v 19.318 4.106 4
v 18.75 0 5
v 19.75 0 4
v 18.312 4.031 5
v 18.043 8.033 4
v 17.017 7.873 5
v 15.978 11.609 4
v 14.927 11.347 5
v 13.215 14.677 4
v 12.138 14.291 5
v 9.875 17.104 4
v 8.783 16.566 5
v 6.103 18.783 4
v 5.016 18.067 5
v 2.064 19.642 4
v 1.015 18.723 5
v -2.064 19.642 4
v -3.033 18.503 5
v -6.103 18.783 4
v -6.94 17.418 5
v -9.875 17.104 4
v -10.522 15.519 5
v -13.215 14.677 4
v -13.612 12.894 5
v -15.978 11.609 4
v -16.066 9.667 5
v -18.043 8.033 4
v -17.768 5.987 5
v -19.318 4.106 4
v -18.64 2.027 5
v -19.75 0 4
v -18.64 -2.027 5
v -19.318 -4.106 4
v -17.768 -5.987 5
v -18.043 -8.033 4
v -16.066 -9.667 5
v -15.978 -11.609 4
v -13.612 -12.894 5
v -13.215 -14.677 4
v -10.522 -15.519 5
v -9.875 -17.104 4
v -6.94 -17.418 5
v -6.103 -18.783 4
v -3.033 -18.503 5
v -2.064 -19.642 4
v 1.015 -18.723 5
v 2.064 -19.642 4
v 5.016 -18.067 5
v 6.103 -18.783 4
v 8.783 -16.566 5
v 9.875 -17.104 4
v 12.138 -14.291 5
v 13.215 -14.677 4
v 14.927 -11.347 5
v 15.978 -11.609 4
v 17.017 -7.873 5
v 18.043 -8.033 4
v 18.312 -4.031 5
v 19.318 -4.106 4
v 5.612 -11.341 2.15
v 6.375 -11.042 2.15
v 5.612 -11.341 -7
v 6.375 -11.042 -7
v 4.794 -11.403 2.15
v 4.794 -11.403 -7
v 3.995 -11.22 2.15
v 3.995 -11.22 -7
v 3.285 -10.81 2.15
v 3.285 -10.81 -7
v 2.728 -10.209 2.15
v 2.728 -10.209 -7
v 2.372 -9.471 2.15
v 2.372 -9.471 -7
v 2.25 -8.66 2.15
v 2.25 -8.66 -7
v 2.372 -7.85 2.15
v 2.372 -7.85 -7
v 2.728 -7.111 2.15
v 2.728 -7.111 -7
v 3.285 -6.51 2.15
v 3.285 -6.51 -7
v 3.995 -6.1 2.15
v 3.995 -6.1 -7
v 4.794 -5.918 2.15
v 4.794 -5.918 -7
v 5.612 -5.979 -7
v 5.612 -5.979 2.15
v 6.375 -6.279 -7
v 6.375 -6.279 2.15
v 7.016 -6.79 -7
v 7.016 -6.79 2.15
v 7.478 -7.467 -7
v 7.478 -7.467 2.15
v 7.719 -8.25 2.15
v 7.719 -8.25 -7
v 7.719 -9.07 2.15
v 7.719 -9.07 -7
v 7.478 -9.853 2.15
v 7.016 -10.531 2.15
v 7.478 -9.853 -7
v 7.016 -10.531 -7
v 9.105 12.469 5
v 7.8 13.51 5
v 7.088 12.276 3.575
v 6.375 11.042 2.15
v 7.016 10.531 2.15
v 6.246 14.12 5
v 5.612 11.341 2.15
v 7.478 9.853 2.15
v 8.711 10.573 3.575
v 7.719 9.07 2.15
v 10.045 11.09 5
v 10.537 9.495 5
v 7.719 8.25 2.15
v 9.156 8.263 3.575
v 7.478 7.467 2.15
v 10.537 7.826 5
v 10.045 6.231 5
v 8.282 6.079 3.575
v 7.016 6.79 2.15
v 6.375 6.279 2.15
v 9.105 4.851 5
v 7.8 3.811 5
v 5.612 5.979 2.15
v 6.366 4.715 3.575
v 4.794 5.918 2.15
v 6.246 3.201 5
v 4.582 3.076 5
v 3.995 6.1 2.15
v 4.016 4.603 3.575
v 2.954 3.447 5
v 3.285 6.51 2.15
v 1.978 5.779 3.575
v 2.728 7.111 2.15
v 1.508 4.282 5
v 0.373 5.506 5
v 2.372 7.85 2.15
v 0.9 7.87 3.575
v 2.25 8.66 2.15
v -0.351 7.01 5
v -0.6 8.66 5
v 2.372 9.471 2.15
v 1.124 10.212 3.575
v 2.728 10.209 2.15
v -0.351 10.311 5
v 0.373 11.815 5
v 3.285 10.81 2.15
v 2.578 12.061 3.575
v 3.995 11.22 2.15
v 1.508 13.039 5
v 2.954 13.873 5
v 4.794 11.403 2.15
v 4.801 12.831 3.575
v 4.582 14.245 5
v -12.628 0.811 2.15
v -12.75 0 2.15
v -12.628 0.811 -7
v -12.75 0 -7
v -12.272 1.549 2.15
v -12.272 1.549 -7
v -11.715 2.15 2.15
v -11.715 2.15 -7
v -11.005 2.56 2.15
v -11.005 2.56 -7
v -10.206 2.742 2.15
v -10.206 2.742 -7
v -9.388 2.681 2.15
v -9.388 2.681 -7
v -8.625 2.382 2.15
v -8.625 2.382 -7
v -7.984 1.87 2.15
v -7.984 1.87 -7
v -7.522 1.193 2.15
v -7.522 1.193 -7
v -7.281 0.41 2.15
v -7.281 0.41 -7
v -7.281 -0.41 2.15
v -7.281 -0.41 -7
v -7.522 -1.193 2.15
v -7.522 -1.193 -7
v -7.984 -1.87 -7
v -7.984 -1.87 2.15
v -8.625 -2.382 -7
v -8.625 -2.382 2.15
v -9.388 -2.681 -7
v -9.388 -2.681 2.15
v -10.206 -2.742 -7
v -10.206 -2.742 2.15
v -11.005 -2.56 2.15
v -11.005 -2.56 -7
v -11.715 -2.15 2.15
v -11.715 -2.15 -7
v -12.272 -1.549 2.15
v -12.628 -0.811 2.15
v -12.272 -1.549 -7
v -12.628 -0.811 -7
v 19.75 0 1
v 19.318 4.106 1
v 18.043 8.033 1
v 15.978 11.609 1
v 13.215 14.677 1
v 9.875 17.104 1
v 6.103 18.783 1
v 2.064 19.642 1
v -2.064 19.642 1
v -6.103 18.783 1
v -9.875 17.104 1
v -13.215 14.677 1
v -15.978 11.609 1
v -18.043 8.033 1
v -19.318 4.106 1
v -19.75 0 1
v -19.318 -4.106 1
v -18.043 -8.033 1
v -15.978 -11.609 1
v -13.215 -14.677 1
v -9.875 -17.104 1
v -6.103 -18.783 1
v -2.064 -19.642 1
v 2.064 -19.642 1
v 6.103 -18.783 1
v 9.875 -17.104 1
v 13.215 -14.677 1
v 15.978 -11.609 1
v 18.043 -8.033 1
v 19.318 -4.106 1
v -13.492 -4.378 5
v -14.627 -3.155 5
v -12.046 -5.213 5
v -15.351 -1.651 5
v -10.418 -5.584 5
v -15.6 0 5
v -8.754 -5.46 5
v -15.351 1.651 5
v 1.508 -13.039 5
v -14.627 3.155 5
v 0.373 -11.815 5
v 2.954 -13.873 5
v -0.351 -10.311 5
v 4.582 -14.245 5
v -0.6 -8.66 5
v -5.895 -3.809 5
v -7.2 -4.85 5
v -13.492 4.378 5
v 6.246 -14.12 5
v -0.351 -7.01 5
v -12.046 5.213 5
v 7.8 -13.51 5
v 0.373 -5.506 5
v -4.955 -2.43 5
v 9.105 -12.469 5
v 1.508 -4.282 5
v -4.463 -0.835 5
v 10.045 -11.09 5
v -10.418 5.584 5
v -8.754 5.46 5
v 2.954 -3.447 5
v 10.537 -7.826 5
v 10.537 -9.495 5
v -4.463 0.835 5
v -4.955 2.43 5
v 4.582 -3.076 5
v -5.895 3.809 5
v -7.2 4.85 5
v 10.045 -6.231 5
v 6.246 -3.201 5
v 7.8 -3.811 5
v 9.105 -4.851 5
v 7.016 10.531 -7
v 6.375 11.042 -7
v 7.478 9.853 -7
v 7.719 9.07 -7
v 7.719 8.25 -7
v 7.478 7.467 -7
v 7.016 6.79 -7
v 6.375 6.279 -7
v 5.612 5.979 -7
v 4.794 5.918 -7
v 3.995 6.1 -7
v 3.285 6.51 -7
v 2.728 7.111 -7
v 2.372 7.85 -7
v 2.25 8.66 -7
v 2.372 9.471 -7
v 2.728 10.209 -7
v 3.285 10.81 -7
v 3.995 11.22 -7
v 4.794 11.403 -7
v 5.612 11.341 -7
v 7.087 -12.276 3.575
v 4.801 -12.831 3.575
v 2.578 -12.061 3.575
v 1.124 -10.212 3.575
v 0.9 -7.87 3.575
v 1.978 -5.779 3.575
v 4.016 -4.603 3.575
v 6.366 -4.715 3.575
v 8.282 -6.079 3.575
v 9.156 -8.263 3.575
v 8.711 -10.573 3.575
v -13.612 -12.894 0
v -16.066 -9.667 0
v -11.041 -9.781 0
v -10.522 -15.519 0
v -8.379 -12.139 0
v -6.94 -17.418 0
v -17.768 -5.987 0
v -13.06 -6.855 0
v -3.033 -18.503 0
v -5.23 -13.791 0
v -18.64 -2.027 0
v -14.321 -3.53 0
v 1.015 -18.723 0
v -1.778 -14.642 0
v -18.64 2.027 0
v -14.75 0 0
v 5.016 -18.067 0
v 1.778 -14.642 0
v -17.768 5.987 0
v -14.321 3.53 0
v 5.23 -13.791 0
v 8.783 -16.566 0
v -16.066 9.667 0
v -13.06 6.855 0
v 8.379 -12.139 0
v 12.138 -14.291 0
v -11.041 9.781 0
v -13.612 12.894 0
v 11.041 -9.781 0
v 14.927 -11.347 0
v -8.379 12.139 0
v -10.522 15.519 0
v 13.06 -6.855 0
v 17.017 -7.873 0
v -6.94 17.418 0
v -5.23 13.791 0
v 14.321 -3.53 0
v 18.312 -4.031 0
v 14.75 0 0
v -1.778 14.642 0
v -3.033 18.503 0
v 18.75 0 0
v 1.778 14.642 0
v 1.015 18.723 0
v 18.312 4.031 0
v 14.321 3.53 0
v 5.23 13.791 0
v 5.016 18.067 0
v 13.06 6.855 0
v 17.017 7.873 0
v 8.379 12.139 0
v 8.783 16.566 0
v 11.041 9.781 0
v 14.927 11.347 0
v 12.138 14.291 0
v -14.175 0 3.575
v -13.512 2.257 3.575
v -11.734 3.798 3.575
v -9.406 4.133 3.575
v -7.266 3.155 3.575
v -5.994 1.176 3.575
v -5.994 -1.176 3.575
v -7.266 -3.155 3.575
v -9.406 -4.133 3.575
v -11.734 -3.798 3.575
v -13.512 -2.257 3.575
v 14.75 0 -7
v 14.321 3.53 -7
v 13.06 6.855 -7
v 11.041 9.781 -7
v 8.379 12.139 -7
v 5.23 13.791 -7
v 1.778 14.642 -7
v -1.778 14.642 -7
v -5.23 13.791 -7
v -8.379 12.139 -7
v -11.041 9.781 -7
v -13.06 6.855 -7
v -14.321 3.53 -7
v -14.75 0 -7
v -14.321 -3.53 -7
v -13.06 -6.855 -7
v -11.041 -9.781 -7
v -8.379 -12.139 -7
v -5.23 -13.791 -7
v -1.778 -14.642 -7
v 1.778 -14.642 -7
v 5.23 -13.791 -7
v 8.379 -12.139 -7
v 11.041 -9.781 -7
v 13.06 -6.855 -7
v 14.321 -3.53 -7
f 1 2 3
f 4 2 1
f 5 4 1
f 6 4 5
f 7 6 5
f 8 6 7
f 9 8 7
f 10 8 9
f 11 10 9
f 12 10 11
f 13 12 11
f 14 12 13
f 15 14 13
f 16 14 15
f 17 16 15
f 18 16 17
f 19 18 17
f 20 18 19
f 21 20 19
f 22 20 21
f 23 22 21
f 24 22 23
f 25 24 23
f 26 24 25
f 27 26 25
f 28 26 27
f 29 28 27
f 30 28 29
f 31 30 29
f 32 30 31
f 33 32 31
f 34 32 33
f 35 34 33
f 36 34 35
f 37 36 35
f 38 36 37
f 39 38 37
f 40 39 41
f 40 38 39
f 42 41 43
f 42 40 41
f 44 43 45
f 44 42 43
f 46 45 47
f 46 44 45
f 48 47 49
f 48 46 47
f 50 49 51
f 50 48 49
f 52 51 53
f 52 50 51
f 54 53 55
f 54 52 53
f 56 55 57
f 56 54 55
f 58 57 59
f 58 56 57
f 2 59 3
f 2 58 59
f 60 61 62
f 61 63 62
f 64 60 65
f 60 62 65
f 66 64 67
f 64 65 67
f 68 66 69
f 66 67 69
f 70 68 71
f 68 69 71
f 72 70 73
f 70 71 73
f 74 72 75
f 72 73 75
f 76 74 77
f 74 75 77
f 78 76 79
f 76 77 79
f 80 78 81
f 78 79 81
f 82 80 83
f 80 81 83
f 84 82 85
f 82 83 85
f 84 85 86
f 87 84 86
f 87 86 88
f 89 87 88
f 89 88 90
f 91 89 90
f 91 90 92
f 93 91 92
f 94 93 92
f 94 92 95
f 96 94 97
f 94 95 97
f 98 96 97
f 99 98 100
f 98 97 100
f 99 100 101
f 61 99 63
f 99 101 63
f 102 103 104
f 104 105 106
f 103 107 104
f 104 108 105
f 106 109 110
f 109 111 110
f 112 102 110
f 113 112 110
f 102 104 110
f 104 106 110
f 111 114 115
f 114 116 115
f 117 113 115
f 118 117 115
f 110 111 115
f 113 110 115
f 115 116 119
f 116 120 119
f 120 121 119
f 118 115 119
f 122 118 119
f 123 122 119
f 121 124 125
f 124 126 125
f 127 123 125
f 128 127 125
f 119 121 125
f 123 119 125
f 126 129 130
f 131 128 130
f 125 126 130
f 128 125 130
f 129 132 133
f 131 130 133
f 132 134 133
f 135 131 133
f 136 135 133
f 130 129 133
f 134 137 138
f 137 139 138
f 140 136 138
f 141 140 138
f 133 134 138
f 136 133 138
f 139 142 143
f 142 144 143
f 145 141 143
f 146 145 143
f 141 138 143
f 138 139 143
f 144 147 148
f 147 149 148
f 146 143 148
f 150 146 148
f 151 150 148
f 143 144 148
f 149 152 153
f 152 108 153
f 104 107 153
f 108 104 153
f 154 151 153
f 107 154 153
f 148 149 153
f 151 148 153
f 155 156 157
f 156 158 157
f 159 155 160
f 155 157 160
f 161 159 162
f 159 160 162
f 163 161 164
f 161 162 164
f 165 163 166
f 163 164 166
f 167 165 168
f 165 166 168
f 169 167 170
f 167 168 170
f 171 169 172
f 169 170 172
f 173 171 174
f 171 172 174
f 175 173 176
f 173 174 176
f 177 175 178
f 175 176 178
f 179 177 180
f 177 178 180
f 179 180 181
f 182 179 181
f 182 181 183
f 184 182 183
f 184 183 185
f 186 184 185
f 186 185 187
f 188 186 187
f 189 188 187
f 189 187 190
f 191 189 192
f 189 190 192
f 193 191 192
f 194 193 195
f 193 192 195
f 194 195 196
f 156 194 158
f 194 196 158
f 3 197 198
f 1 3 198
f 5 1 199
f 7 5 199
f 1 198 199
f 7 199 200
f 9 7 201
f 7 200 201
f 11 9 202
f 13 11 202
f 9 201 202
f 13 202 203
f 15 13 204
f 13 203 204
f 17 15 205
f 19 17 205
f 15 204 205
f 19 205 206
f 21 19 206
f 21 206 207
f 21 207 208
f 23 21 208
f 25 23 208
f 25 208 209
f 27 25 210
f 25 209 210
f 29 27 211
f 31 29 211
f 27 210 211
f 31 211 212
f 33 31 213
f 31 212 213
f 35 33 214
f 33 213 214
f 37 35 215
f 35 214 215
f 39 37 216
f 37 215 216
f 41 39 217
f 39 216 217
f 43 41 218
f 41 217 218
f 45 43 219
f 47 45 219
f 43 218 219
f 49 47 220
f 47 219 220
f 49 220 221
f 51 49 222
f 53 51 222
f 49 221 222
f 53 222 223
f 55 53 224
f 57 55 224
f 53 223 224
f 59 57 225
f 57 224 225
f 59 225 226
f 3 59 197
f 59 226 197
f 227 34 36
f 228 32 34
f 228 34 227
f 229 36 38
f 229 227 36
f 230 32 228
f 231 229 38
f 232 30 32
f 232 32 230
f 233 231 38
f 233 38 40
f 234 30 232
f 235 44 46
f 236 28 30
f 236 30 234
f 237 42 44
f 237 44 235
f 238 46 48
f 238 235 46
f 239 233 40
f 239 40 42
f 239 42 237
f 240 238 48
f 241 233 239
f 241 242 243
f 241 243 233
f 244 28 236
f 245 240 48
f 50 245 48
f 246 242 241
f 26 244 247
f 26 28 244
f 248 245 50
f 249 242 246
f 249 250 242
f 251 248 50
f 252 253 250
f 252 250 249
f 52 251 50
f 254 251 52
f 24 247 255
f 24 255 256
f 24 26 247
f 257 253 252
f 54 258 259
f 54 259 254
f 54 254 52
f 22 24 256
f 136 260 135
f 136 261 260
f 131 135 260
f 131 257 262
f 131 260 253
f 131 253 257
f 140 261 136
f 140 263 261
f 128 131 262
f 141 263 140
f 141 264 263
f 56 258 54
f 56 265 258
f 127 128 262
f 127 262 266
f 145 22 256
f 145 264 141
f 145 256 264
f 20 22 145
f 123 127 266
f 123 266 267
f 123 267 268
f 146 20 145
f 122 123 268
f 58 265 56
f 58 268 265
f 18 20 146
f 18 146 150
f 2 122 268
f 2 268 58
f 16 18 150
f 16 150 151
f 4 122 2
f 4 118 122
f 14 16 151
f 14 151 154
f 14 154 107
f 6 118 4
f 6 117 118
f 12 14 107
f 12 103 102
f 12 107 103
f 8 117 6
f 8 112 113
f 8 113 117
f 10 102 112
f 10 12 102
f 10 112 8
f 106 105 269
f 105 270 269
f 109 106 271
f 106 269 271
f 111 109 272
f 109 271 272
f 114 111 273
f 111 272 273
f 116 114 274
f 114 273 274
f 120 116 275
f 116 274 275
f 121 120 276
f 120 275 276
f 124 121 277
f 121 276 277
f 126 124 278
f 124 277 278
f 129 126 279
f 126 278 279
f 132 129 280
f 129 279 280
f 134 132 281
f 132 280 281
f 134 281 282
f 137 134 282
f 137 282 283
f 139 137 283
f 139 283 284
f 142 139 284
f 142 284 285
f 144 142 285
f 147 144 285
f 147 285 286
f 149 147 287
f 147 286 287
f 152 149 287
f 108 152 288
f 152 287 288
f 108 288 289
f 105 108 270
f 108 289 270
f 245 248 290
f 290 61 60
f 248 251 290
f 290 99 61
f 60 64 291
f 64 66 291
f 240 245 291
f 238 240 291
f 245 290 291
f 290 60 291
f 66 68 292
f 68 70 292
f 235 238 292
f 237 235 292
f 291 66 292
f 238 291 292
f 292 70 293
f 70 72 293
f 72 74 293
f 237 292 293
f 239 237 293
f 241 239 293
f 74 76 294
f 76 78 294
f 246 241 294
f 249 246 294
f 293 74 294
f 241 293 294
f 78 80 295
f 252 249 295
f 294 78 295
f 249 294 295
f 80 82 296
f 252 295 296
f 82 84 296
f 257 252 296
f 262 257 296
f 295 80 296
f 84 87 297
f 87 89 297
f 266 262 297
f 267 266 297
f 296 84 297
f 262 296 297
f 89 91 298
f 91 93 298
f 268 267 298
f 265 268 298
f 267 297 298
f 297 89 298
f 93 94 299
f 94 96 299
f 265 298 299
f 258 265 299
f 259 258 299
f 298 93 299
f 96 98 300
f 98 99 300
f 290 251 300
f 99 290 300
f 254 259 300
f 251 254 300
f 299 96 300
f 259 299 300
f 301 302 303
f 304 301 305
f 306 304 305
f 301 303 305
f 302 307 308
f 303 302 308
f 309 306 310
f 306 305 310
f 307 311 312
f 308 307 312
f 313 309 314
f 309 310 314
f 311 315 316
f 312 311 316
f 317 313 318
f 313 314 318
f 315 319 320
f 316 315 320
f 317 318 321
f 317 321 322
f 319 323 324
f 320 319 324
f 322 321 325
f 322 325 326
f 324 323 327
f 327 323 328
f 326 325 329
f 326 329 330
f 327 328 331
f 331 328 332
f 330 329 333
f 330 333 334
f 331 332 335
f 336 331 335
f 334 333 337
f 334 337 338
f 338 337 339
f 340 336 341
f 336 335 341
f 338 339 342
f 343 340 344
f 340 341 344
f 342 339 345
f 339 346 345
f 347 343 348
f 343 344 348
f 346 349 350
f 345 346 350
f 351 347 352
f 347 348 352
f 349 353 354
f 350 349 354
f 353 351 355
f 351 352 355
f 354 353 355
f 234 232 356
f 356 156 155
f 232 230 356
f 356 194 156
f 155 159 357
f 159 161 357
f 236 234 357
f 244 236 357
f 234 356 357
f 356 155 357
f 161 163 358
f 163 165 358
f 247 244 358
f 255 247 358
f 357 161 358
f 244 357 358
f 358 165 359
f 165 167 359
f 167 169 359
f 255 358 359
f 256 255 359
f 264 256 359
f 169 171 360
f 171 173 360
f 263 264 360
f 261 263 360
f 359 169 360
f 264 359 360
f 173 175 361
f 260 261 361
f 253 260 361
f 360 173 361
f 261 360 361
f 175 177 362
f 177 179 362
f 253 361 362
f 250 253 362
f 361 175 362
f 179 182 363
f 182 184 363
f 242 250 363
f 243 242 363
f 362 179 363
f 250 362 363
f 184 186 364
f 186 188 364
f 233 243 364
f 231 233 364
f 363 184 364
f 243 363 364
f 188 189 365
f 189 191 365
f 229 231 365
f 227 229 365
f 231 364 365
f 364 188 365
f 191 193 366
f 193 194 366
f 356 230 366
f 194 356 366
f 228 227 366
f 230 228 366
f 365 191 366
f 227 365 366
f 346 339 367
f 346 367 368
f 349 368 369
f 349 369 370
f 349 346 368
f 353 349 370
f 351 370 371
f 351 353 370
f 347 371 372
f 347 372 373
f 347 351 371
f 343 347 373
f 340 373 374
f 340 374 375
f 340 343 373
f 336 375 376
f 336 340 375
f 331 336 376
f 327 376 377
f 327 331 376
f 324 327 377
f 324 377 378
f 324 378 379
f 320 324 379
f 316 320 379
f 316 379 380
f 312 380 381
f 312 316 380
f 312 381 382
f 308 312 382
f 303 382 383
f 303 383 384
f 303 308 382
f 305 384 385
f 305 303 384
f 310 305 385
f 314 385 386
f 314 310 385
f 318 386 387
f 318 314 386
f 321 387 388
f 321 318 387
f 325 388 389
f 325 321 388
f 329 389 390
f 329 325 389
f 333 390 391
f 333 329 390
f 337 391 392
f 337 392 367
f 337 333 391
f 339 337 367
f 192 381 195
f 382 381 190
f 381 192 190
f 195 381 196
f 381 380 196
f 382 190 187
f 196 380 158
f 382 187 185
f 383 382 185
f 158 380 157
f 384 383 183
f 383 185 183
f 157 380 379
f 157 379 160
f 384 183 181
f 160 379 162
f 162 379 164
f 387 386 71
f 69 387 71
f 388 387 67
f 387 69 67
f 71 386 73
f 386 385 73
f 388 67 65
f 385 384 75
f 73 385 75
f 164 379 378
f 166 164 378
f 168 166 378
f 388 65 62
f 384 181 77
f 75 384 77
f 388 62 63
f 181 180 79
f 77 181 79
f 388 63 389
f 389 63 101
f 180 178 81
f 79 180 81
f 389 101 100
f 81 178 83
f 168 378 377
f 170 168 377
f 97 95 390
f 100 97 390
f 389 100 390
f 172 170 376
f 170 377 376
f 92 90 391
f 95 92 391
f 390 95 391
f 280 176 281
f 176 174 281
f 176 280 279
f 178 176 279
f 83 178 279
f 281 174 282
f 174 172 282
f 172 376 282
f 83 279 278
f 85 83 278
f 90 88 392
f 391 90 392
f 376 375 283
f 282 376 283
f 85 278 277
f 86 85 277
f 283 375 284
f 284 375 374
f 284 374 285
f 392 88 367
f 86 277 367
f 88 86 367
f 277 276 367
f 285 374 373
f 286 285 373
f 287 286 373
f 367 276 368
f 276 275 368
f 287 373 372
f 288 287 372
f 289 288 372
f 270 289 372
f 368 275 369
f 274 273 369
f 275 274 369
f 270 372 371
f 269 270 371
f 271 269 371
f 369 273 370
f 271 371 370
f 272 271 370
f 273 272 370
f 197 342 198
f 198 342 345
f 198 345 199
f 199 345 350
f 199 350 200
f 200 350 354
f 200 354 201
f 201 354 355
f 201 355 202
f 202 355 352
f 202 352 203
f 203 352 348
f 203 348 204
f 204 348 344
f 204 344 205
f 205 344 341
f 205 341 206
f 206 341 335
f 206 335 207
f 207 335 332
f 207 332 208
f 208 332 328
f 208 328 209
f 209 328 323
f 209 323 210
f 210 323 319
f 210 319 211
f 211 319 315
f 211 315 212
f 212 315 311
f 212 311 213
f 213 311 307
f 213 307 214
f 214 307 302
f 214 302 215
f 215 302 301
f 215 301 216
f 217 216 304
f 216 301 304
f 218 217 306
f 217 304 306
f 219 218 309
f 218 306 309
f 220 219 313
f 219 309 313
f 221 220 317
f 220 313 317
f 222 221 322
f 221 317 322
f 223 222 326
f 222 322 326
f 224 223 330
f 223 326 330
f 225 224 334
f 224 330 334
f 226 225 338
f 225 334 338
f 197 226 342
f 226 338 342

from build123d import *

# Parameters (mm, degrees)
F0_R            = 14.75
F2_DEPTH        = 7
F3_R            = 19.75
F3_R_2          = 14.75
F4_DEPTH        = 5
F6_D            = 5.5
F6_CSINK_D      = 11.2
F6_CSINK_ANGLE  = 90
F6_COPIES_COUNT = 3
F7_SIZE         = 1


# Not quite as in the source:
# - a pattern or mirror of a feature is missing from the dataset's text; its kind, count and spacing are read off the source's solid


with BuildPart() as f2:
    # F0 (on Top) → F2 (new body)
    with BuildSketch(Plane.XY):
        Circle(F0_R)
    extrude(amount=-F2_DEPTH)

    # F3 (on face) → F4 (join)
    with BuildSketch(Plane.XY):
        Circle(F3_R)
        Circle(F3_R_2, mode=Mode.SUBTRACT)
        Circle(F3_R_2)
    extrude(amount=F4_DEPTH)

    # F6 (through all)
    with Locations(Plane.XY.offset(5)):
        with Locations((-10, 0)):
            f6 = CounterSinkHole(F6_D / 2, F6_CSINK_D / 2, counter_sink_angle=F6_CSINK_ANGLE)

    # F6_copies: F6 ×3 about axis
    f6_copies_axis = Axis((0, 0, 0), (0, 0, 1))
    for i in range(1, F6_COPIES_COUNT):
        add(f6.rotate(f6_copies_axis, i * 360 / F6_COPIES_COUNT), mode=Mode.SUBTRACT)

    # F7
    f7_edges = [f2.edges().sort_by_distance(p)[0] for p in [
        (-19.75, 0, 5),
        (-19.75, 0, 0),
    ]]
    chamfer(f7_edges, length=F7_SIZE)


solid = f2.part
